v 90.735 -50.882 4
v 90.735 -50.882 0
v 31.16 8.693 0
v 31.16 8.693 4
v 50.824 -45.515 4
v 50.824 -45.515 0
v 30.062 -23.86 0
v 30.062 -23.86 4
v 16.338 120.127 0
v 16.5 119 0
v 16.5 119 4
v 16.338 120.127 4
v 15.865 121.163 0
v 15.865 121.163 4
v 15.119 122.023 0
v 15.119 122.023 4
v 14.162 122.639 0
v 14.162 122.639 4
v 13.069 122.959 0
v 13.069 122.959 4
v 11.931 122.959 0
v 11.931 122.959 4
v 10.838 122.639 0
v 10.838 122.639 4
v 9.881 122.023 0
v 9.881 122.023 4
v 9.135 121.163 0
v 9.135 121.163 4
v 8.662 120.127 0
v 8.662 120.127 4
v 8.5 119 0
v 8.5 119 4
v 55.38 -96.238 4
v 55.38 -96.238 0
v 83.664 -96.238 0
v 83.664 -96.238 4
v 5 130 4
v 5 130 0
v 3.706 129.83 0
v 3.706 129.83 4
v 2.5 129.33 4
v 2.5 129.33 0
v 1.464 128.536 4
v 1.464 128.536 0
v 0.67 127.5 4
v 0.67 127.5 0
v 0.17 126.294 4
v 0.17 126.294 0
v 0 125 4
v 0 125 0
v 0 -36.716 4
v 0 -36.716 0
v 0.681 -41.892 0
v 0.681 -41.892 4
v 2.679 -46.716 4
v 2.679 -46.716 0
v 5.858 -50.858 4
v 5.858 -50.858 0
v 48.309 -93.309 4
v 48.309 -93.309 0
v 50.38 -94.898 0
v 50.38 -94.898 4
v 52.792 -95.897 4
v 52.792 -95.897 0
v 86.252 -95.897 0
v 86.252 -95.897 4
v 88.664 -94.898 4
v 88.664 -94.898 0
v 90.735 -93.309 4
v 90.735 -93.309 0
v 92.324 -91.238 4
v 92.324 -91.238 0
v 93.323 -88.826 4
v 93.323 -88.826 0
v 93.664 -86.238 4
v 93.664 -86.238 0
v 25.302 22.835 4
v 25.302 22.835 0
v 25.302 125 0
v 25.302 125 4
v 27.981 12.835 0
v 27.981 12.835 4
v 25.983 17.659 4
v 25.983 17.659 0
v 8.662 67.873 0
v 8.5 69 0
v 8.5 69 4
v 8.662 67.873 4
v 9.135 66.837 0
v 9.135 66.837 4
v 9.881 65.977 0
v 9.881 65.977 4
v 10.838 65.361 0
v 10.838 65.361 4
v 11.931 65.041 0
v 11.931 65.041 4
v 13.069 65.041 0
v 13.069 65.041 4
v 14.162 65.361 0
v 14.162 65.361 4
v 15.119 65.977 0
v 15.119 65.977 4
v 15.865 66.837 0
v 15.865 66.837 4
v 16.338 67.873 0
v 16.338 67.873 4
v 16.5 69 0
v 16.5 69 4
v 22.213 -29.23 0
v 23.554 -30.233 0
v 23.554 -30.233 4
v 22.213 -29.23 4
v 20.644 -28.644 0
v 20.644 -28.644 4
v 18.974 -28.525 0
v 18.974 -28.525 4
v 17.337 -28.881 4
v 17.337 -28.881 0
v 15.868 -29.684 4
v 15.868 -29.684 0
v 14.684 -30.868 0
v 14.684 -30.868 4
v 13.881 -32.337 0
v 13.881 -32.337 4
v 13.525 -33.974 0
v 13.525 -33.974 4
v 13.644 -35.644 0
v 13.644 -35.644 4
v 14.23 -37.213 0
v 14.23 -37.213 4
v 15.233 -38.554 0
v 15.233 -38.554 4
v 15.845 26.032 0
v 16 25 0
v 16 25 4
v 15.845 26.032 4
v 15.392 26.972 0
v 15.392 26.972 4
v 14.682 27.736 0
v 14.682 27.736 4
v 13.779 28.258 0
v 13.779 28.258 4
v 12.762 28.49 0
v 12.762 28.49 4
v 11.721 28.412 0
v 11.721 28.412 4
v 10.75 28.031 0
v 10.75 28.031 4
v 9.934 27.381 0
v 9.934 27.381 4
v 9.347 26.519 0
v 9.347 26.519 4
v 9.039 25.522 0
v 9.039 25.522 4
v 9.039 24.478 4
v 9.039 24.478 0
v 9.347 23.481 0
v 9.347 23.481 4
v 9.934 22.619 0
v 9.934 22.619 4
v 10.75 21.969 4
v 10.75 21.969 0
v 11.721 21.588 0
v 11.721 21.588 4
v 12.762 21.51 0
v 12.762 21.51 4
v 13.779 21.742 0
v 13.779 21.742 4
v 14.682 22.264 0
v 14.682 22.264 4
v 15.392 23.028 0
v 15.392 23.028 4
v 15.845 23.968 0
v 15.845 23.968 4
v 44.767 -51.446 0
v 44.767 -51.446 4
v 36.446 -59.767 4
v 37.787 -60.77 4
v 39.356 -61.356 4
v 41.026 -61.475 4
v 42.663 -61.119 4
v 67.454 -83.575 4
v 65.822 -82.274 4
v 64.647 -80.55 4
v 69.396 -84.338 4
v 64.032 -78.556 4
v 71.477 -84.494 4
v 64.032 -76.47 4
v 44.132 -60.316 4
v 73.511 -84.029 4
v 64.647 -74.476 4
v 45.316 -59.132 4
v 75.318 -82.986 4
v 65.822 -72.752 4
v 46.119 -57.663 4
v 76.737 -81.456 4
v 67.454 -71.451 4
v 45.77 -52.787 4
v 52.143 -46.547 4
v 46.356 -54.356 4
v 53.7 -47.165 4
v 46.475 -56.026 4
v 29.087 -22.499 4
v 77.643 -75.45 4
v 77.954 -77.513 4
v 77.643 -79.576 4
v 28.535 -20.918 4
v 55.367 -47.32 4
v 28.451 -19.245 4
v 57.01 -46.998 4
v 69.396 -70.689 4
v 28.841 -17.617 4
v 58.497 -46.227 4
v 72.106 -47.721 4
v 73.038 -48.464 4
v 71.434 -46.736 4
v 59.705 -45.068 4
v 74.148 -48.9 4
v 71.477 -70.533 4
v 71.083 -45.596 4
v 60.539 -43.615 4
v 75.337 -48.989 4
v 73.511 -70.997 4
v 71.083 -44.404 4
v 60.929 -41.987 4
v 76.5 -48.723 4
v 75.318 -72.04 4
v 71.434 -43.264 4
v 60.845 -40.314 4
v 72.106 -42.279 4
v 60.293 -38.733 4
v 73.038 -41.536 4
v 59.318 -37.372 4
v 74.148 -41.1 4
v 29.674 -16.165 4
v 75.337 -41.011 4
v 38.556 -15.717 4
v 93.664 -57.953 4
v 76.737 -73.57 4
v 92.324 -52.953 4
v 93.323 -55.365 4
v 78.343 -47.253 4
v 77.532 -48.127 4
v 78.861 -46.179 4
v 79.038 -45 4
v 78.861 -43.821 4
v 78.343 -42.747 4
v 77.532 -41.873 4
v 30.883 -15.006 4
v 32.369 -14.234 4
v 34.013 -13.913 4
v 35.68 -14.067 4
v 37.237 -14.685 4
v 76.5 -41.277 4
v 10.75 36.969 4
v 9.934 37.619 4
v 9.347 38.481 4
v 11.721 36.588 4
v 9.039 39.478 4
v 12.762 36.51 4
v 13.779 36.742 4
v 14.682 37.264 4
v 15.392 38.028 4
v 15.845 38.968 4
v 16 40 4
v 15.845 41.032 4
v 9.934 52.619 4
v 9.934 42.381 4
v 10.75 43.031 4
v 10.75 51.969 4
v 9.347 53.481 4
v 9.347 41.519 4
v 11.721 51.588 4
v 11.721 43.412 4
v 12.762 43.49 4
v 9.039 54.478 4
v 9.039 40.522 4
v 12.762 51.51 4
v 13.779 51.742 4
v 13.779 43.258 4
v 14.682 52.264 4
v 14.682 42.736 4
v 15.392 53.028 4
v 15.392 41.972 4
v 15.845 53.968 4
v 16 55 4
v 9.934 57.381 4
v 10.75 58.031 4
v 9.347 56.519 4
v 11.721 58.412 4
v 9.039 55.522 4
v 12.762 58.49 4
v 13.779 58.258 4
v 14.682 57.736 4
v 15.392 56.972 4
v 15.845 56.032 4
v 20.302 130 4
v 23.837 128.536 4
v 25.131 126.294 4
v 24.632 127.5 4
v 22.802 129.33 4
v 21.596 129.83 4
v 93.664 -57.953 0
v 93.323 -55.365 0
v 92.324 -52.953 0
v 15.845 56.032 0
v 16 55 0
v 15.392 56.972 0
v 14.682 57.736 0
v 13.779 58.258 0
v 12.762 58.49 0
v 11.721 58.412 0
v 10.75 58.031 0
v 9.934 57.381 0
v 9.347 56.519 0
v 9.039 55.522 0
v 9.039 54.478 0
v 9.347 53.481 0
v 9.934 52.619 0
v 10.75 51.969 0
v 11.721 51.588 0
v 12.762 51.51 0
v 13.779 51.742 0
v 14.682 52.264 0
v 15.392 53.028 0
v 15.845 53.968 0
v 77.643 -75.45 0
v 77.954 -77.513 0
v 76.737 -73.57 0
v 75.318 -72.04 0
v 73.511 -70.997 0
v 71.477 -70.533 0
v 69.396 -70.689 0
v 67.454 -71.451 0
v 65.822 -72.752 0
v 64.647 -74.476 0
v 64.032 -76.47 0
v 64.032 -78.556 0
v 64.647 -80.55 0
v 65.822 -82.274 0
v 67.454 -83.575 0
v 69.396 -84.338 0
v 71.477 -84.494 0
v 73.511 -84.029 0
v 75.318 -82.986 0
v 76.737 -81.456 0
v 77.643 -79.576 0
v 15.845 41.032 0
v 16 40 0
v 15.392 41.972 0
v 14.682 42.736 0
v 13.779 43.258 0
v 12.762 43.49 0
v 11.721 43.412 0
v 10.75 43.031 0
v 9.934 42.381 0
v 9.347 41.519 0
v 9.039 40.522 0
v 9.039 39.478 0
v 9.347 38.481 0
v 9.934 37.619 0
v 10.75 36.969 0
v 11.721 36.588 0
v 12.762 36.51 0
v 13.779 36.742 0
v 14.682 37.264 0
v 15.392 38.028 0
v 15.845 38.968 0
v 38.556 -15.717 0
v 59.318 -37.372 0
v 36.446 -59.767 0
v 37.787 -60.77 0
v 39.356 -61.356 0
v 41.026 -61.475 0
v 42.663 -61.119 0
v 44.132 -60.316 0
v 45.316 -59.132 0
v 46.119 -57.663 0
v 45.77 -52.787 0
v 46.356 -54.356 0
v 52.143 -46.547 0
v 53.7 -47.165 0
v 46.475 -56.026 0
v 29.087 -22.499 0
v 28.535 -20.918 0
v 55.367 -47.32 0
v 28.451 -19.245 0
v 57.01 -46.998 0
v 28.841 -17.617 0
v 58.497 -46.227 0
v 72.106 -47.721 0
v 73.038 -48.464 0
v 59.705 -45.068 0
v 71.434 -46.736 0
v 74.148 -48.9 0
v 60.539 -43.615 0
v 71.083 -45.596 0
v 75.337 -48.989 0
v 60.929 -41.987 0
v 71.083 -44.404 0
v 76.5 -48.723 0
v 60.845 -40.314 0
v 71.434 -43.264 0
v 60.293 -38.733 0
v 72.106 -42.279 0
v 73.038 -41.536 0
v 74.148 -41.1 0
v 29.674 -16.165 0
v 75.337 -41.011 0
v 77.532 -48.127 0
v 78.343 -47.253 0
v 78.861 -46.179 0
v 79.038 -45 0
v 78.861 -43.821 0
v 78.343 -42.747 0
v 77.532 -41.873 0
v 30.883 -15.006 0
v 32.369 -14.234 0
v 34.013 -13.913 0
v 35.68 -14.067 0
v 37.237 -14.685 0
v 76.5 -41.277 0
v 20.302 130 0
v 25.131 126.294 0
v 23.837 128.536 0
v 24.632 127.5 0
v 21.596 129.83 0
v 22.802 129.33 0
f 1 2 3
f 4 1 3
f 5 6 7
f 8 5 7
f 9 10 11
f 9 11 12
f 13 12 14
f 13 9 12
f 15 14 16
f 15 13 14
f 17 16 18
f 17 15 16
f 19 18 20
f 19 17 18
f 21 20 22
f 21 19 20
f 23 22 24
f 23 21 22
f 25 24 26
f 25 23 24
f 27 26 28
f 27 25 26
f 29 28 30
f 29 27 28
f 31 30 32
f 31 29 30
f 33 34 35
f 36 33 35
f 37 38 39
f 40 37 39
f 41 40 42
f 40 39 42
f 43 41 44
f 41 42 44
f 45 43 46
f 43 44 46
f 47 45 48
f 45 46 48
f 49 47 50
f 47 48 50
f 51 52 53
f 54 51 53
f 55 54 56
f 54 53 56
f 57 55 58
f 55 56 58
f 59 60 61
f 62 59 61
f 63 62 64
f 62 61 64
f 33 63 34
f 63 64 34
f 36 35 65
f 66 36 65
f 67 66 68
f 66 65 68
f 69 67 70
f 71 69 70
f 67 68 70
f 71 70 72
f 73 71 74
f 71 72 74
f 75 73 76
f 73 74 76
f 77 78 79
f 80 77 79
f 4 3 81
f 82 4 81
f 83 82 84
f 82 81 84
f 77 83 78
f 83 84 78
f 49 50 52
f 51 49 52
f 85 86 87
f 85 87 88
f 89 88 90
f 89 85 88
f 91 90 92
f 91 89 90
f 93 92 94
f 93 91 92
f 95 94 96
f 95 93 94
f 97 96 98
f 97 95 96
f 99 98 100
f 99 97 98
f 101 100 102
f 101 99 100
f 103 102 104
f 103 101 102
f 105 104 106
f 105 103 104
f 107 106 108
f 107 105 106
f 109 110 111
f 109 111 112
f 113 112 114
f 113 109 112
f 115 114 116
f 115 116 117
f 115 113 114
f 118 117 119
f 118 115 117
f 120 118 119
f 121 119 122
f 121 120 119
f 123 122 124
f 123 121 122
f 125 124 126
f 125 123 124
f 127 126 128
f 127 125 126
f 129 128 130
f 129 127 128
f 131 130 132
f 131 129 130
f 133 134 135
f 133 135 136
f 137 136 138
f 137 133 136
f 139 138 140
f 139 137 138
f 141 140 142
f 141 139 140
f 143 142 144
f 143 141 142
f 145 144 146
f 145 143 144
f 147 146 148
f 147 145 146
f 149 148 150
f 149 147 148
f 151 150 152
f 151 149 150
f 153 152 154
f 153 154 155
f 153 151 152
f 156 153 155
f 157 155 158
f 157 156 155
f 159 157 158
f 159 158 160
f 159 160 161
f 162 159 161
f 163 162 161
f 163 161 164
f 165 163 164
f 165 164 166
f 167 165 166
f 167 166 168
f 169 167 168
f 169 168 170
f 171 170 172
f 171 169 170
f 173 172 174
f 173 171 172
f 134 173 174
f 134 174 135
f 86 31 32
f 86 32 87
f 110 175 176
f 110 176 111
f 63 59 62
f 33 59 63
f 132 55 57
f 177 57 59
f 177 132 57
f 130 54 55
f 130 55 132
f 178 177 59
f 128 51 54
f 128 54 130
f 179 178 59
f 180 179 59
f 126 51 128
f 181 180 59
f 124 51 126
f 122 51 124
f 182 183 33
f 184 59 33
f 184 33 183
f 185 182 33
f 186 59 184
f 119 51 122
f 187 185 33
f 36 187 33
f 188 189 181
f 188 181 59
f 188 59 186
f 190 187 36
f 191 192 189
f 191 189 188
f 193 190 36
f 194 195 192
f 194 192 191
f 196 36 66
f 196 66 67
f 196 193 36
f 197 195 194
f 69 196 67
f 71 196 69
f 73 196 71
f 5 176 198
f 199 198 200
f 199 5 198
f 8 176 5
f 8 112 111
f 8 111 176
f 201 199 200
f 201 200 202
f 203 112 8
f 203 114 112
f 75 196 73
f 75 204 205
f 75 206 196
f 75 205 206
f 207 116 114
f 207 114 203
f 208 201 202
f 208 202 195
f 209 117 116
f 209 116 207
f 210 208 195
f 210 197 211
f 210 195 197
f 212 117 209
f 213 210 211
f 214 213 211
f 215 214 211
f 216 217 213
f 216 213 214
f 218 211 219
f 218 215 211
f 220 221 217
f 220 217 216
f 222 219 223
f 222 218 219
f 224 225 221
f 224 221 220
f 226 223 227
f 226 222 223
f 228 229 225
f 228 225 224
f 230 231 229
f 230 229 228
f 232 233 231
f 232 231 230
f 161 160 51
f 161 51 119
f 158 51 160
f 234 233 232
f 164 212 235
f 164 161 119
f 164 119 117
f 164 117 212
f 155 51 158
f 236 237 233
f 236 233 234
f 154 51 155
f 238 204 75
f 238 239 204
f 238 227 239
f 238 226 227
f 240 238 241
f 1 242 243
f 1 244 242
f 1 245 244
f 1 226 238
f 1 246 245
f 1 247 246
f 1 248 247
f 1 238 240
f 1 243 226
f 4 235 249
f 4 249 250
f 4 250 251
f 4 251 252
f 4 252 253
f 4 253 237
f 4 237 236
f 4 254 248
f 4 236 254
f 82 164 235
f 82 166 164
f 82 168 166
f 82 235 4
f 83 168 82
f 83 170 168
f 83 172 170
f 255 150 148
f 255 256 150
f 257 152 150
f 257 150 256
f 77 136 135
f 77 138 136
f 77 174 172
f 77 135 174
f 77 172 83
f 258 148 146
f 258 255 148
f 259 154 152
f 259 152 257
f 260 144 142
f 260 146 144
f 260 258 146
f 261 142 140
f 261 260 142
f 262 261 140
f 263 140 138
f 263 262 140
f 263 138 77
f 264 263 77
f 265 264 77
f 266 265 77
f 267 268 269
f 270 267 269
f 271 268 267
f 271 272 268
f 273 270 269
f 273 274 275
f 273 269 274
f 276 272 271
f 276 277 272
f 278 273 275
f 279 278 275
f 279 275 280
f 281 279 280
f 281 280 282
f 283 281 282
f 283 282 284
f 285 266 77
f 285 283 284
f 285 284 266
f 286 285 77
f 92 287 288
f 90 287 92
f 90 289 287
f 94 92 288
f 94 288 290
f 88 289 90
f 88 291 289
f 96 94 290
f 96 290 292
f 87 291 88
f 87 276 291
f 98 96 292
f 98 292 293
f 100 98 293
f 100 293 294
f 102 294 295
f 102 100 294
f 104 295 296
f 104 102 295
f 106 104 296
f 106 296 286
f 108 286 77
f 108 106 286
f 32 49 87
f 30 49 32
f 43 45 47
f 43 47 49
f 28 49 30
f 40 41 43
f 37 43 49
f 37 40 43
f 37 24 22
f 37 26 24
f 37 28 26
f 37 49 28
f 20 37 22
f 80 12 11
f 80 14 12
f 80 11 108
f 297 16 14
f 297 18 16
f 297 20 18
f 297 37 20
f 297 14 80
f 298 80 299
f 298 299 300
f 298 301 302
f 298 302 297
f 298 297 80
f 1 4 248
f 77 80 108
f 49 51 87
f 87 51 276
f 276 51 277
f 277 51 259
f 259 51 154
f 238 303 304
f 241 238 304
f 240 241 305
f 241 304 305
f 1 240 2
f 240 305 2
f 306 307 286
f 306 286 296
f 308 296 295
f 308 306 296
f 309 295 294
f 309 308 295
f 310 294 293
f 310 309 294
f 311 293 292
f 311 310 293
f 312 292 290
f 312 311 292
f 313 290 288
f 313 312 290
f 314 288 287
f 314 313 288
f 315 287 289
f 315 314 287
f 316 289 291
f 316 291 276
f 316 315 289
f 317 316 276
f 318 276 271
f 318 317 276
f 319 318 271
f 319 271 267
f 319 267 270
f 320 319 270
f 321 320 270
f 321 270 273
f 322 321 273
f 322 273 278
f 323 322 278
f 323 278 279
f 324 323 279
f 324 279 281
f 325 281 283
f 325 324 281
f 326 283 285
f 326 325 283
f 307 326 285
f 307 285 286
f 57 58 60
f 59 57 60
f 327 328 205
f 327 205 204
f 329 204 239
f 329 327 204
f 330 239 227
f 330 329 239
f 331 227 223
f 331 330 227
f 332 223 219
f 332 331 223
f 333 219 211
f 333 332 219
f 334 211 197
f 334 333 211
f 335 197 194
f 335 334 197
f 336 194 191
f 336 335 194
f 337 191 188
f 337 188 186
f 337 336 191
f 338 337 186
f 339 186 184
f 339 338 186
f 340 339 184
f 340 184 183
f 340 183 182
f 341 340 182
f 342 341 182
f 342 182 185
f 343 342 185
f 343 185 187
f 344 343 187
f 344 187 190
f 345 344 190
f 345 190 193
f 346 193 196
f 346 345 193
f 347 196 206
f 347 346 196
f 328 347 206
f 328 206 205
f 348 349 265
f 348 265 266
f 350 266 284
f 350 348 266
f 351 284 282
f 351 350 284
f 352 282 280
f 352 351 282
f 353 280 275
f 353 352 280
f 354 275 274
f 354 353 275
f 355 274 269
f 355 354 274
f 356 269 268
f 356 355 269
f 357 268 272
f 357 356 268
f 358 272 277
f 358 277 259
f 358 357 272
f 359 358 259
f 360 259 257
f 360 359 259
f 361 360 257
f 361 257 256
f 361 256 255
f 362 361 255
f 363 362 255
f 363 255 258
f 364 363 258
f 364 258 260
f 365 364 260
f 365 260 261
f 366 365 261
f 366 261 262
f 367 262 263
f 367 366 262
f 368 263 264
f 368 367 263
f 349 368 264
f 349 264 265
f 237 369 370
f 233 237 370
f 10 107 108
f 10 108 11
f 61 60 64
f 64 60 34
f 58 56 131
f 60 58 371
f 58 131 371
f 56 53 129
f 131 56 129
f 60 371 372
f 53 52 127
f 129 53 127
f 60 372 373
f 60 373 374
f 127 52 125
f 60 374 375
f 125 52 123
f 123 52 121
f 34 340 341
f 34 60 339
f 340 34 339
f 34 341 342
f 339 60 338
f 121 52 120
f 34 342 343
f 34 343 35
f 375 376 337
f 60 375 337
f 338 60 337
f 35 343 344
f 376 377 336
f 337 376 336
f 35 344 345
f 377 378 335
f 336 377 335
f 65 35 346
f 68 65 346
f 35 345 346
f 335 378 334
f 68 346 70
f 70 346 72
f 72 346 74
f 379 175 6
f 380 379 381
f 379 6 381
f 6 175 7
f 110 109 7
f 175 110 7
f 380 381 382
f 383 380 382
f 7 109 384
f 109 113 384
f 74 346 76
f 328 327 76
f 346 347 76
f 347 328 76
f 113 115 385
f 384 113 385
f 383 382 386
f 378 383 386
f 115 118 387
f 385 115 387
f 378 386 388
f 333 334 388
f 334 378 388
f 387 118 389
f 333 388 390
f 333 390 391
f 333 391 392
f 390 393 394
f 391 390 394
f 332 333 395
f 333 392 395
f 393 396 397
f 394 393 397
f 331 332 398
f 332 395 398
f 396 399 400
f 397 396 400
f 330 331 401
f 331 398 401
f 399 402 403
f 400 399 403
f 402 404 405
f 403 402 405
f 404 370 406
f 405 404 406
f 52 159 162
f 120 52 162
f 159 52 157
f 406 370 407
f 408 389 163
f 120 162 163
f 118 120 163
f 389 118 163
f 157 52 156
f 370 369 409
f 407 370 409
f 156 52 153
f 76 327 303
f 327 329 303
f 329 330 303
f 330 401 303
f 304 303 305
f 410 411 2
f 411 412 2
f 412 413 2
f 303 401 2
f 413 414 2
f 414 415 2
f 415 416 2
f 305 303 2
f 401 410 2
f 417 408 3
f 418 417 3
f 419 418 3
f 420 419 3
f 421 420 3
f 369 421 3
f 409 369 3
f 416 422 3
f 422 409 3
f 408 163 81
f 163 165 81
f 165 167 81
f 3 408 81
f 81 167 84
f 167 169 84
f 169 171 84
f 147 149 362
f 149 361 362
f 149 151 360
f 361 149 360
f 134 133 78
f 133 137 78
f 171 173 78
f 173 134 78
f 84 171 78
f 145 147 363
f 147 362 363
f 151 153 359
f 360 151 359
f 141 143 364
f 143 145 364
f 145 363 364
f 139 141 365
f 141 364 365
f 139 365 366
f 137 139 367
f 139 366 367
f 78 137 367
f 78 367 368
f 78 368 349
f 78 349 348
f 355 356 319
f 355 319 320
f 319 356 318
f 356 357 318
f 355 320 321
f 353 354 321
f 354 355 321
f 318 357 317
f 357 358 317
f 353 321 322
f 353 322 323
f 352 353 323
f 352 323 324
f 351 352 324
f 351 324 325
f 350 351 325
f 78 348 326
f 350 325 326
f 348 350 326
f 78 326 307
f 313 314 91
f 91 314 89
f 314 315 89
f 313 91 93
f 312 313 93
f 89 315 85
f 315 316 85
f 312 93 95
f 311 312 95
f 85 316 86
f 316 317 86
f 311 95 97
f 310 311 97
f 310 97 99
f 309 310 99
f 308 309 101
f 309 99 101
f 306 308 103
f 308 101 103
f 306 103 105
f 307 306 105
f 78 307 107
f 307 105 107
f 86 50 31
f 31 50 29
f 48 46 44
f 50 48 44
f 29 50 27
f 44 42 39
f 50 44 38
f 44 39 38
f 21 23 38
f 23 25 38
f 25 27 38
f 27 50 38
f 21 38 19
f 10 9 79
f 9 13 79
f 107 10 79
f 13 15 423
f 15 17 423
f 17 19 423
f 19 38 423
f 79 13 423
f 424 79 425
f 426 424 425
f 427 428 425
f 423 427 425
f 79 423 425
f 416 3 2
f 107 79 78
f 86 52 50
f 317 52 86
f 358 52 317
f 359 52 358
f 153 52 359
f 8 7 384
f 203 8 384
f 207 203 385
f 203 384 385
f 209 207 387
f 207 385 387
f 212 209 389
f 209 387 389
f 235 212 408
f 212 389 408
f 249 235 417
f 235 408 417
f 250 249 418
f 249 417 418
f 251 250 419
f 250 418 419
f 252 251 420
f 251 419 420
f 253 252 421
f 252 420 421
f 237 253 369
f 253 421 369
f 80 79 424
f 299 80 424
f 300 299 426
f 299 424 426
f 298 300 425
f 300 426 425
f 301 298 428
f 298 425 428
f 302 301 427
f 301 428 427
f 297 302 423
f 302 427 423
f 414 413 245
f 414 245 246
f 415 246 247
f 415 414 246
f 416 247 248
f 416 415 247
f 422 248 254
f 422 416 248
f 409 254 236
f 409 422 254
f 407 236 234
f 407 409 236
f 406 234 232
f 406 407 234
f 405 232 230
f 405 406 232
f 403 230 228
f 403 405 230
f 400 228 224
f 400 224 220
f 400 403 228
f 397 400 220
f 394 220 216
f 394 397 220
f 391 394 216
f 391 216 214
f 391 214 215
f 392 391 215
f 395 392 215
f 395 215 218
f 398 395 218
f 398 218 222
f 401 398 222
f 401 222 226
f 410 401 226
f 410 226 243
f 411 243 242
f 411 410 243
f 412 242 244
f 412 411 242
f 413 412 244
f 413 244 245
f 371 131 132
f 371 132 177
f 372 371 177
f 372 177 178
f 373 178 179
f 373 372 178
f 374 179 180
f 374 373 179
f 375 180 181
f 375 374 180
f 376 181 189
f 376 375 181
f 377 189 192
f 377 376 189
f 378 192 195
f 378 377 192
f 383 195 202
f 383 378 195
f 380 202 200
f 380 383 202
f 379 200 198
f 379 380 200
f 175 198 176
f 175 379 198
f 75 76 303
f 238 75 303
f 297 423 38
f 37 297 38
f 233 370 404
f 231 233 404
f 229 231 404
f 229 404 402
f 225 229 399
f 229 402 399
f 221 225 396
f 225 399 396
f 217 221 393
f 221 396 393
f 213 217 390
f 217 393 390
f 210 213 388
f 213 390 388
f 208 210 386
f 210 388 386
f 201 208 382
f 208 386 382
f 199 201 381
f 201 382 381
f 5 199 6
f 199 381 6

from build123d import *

# Parameters (mm, degrees)
SKETCH1_R           = 3.5
SKETCH1_R_2         = 7
SKETCH1_R_3         = 4
BOSS_EXTRUDE1_DEPTH = 4


with BuildPart() as part:
    # Sketch1 → Boss-Extrude1 (new body)
    with BuildSketch(Plane.XY):
        with BuildLine():
            Line((55.379885617, -96.237749993), (83.664156864, -96.237749993))
            ThreePointArc((83.664156864, -96.237749993), (90.735224676, -93.308817805), (93.664156864, -86.237749993))
            Line((93.664156864, -86.237749993), (93.664156864, -57.953478746))
            ThreePointArc((93.664156864, -57.953478746), (92.902952189, -54.126644422), (90.735224676, -50.882410934))
            Line((90.735224676, -50.882410934), (31.159701747, 8.693111995))
            ThreePointArc((31.159701747, 8.693111995), (26.824246721, 15.181578972), (25.301837371, 22.835247619))
            Line((25.301837371, 22.835247619), (25.301837371, 125))
            ThreePointArc((25.301837371, 125), (23.837371277, 128.535533906), (20.301837371, 130))
            Line((20.301837371, 130), (5, 130))
            ThreePointArc((5, 130), (1.464466094, 128.535533906), (0, 125))
            Line((0, 125), (0, 5))
            Line((0, 5), (0, -36.715728753))
            ThreePointArc((0, -36.715728753), (1.52240935, -44.3693974), (5.857864376, -50.857864376))
            Line((5.857864376, -50.857864376), (48.308817805, -93.308817805))
            ThreePointArc((48.308817805, -93.308817805), (51.553051293, -95.476545318), (55.379885617, -96.237749993))
        make_face()
        with Locations((12.5, 55)):
            Circle(SKETCH1_R, mode=Mode.SUBTRACT)
        with Locations((12.5, 40)):
            Circle(SKETCH1_R, mode=Mode.SUBTRACT)
        with Locations((12.5, 25)):
            Circle(SKETCH1_R, mode=Mode.SUBTRACT)
        with Locations((70.953796111, -77.513095535)):
            Circle(SKETCH1_R_2, mode=Mode.SUBTRACT)
        with Locations((75.03834495, -45)):
            Circle(SKETCH1_R_3, mode=Mode.SUBTRACT)
        with BuildLine():
            Line((38.555717556, -15.716967459), (59.317673007, -37.372017813))
            ThreePointArc((59.317673007, -37.372017813), (59.142526441, -45.690498717), (50.824045538, -45.515352151))
            Line((50.824045538, -45.515352151), (30.062090086, -23.860301797))
            ThreePointArc((30.062090086, -23.860301797), (30.237236652, -15.541820893), (38.555717556, -15.716967459))
        make_face(mode=Mode.SUBTRACT)
        with BuildLine():
            ThreePointArc((8.5, 69), (12.5, 65), (16.5, 69))
            Line((16.5, 69), (16.5, 119))
            ThreePointArc((16.5, 119), (12.5, 123), (8.5, 119))
            Line((8.5, 119), (8.5, 69))
        make_face(mode=Mode.SUBTRACT)
        with BuildLine():
            ThreePointArc((36.446439435, -59.766764), (44.766764, -59.766764), (44.766764, -51.446439435))
            Line((44.766764, -51.446439435), (23.553560565, -30.233236))
            ThreePointArc((23.553560565, -30.233236), (15.233236, -30.233236), (15.233236, -38.553560565))
            Line((15.233236, -38.553560565), (36.446439435, -59.766764))
        make_face(mode=Mode.SUBTRACT)
    extrude(amount=BOSS_EXTRUDE1_DEPTH)


solid = part.part
